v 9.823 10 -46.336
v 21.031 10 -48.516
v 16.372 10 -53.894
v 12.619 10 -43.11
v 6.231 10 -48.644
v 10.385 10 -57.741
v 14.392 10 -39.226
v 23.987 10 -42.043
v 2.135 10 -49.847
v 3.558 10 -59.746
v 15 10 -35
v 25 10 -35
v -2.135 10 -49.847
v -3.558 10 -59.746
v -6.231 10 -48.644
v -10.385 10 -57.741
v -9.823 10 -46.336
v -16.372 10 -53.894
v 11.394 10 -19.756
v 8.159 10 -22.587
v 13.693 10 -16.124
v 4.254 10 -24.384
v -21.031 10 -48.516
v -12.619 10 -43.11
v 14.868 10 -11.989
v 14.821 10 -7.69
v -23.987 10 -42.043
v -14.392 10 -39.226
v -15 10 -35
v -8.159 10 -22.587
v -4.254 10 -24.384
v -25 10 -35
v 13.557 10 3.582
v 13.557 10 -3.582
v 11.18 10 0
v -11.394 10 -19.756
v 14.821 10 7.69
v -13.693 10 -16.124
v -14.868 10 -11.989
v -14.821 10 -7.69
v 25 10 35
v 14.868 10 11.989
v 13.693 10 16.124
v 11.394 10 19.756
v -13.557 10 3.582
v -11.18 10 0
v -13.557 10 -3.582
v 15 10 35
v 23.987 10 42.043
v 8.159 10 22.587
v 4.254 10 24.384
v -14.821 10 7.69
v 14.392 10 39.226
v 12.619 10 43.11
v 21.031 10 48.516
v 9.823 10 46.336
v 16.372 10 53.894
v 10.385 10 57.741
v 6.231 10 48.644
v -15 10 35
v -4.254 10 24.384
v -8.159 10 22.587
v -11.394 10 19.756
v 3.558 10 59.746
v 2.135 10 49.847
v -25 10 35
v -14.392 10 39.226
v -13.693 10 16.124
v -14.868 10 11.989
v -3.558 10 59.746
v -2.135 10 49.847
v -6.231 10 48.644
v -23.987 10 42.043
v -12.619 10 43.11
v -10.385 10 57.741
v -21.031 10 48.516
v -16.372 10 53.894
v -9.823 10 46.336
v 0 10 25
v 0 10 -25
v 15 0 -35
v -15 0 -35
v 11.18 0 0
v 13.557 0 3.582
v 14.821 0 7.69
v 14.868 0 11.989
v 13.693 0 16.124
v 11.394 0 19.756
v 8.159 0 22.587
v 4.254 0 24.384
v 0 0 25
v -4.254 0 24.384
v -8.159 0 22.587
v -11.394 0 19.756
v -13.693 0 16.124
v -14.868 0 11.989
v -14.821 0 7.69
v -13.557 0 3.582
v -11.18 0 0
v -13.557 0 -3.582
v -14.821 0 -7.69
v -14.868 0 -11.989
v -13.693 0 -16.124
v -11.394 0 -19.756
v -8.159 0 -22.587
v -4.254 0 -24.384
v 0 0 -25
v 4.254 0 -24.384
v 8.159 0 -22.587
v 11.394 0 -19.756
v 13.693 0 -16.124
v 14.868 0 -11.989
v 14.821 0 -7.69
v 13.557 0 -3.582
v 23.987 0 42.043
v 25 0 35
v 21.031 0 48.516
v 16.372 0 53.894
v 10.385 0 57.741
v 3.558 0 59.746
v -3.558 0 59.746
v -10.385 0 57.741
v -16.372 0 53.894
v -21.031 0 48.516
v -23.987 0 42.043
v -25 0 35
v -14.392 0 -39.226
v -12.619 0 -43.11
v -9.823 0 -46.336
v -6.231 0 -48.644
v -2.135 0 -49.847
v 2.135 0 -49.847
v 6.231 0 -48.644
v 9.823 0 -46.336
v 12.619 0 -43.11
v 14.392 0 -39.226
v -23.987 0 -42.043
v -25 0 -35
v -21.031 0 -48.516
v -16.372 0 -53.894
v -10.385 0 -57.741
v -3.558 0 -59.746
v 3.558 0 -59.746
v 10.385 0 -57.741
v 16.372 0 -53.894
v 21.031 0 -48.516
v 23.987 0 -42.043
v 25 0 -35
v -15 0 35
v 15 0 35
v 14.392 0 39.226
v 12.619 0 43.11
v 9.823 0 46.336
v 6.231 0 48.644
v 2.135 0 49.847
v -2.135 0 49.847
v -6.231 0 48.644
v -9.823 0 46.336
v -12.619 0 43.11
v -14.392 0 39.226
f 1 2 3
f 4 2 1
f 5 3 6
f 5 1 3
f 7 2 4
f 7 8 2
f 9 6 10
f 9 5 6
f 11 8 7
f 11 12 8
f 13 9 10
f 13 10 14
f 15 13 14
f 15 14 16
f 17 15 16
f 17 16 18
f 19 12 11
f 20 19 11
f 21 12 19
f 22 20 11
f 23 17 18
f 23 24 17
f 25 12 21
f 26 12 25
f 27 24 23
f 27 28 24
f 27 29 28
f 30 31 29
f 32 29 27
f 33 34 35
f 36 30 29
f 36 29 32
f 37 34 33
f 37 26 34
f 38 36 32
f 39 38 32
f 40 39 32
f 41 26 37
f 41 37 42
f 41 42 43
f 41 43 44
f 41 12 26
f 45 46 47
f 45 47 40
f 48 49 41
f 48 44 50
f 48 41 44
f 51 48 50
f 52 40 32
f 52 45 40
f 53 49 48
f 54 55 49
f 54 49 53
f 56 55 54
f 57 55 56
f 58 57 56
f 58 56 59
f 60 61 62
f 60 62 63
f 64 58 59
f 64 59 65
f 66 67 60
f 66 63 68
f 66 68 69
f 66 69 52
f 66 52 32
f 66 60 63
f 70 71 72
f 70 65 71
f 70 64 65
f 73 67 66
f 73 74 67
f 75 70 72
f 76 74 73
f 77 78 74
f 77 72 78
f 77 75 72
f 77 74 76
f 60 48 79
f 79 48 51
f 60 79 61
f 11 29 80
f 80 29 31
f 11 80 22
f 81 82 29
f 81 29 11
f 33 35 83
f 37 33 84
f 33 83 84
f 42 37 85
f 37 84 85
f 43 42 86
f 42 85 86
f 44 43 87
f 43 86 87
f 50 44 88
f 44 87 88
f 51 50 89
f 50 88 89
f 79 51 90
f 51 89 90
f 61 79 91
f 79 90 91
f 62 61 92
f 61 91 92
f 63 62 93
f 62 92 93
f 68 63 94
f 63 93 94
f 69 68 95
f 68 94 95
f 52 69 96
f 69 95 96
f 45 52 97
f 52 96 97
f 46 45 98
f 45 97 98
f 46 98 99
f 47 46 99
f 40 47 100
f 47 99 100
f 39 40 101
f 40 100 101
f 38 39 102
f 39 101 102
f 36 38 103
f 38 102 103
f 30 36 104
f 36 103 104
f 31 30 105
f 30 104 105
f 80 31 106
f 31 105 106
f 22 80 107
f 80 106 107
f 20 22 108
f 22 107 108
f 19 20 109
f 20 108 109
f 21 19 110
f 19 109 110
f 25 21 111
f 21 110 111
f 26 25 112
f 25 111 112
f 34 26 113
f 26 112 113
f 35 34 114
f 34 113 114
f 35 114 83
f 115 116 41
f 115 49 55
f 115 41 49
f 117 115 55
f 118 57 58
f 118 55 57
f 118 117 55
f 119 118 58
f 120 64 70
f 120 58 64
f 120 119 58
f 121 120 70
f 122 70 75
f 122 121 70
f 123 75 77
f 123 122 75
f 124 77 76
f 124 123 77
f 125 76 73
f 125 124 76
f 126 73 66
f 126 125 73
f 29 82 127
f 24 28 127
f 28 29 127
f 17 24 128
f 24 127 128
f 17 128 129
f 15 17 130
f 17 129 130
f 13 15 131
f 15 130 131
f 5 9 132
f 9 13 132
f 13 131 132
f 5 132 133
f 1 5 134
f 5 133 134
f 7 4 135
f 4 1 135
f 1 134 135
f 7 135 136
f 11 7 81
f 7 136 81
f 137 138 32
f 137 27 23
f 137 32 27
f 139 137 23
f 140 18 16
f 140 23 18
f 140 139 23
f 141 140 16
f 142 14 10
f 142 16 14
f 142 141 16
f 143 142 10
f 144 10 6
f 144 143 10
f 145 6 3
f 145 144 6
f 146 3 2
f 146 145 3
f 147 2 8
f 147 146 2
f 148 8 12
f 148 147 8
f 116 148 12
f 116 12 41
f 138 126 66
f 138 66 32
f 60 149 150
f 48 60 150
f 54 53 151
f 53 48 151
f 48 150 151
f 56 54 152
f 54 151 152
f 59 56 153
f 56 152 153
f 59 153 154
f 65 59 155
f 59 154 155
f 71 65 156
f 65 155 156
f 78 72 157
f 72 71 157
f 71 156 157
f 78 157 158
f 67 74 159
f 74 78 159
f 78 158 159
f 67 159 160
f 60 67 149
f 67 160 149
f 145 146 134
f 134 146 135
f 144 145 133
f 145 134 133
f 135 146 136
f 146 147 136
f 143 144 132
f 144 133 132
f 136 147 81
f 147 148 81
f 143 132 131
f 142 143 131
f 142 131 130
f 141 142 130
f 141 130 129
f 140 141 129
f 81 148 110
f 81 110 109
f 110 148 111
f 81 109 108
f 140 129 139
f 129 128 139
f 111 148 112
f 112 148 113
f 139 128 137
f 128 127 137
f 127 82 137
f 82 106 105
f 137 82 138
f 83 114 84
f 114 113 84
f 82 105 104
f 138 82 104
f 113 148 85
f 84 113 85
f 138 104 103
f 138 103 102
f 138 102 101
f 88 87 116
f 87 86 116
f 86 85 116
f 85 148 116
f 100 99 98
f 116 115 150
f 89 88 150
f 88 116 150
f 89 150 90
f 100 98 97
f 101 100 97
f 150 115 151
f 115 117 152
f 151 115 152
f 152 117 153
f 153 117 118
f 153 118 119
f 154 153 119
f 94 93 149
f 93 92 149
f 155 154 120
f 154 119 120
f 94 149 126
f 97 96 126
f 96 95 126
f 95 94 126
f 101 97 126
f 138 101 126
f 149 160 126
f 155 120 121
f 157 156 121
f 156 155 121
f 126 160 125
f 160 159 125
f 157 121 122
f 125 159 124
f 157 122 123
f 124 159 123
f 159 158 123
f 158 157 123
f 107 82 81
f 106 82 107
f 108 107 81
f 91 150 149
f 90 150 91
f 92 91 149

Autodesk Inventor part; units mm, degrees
ref_plane "YZ Plane" through (0, 0, 0) normal (1, 0, 0) x (0, 1, 0)
ref_plane "XZ Plane" through (0, 0, 0) normal (0, 1, 0) x (-1, 0, 0)
ref_plane "XY Plane" through (0, 0, 0) normal (0, 0, 1) x (1, 0, 0)
sketch "Boceto1" plane through (0, 0, 0) normal (0, 1, 0) x (-1, 0, 0)
  line L0 (0, 35) -> (0, -35) construction
  line L1 (25, 35) -> (25, -35)
  line L2 (-25, -35) -> (-25, 35)
  arc A0 (25, 35) -> (-25, 35) centre (0, 35) ccw
  arc A1 (-25, -35) -> (25, -35) centre (0, -35) ccw
  circle A2 centre (0, -35) radius 15
  circle A3 centre (0, 35) radius 15
  line L3 (0, -20) -> (0, -20)
  line L4 (15, -35) -> (-15, -35)
  line L5 (94.5074, 0) -> (-76.0102, 0) construction
  line L6 (15, 35) -> (-15, 35)
  line L7 (15, -35) -> (-15, -35)
  circle A4 centre (0, 10) radius 15
  circle A5 centre (0, -10) radius 15
  point P0 (0, 0)
  point P1 (0, 60)
  point P2 (0, -60)
  point P3 (0, -20)
  point P4 (15, 35)
  point P5 (11.1803, 0)
  point P6 (-11.1803, 0)
  dimension "largo" = 120
  dimension "ancho" = 50
  dimension "espesor_junta" = 10
  dimension "d3" = 10
  dimension "d6" = 0
  dimension "d22" = 30
  dimension "d23" = 30
  dimension "d24" = 20
  dimension "d25" = 10
extrude "Extrusión6" add sketch "Boceto1" along normal blind 10 contours L1 A1 L2 A0 | A2 A5 L4 | A3 L6 A4
equation "\"d3\" = espesor_junta"
properties part number "mod4" material "Aluminio 6061"
